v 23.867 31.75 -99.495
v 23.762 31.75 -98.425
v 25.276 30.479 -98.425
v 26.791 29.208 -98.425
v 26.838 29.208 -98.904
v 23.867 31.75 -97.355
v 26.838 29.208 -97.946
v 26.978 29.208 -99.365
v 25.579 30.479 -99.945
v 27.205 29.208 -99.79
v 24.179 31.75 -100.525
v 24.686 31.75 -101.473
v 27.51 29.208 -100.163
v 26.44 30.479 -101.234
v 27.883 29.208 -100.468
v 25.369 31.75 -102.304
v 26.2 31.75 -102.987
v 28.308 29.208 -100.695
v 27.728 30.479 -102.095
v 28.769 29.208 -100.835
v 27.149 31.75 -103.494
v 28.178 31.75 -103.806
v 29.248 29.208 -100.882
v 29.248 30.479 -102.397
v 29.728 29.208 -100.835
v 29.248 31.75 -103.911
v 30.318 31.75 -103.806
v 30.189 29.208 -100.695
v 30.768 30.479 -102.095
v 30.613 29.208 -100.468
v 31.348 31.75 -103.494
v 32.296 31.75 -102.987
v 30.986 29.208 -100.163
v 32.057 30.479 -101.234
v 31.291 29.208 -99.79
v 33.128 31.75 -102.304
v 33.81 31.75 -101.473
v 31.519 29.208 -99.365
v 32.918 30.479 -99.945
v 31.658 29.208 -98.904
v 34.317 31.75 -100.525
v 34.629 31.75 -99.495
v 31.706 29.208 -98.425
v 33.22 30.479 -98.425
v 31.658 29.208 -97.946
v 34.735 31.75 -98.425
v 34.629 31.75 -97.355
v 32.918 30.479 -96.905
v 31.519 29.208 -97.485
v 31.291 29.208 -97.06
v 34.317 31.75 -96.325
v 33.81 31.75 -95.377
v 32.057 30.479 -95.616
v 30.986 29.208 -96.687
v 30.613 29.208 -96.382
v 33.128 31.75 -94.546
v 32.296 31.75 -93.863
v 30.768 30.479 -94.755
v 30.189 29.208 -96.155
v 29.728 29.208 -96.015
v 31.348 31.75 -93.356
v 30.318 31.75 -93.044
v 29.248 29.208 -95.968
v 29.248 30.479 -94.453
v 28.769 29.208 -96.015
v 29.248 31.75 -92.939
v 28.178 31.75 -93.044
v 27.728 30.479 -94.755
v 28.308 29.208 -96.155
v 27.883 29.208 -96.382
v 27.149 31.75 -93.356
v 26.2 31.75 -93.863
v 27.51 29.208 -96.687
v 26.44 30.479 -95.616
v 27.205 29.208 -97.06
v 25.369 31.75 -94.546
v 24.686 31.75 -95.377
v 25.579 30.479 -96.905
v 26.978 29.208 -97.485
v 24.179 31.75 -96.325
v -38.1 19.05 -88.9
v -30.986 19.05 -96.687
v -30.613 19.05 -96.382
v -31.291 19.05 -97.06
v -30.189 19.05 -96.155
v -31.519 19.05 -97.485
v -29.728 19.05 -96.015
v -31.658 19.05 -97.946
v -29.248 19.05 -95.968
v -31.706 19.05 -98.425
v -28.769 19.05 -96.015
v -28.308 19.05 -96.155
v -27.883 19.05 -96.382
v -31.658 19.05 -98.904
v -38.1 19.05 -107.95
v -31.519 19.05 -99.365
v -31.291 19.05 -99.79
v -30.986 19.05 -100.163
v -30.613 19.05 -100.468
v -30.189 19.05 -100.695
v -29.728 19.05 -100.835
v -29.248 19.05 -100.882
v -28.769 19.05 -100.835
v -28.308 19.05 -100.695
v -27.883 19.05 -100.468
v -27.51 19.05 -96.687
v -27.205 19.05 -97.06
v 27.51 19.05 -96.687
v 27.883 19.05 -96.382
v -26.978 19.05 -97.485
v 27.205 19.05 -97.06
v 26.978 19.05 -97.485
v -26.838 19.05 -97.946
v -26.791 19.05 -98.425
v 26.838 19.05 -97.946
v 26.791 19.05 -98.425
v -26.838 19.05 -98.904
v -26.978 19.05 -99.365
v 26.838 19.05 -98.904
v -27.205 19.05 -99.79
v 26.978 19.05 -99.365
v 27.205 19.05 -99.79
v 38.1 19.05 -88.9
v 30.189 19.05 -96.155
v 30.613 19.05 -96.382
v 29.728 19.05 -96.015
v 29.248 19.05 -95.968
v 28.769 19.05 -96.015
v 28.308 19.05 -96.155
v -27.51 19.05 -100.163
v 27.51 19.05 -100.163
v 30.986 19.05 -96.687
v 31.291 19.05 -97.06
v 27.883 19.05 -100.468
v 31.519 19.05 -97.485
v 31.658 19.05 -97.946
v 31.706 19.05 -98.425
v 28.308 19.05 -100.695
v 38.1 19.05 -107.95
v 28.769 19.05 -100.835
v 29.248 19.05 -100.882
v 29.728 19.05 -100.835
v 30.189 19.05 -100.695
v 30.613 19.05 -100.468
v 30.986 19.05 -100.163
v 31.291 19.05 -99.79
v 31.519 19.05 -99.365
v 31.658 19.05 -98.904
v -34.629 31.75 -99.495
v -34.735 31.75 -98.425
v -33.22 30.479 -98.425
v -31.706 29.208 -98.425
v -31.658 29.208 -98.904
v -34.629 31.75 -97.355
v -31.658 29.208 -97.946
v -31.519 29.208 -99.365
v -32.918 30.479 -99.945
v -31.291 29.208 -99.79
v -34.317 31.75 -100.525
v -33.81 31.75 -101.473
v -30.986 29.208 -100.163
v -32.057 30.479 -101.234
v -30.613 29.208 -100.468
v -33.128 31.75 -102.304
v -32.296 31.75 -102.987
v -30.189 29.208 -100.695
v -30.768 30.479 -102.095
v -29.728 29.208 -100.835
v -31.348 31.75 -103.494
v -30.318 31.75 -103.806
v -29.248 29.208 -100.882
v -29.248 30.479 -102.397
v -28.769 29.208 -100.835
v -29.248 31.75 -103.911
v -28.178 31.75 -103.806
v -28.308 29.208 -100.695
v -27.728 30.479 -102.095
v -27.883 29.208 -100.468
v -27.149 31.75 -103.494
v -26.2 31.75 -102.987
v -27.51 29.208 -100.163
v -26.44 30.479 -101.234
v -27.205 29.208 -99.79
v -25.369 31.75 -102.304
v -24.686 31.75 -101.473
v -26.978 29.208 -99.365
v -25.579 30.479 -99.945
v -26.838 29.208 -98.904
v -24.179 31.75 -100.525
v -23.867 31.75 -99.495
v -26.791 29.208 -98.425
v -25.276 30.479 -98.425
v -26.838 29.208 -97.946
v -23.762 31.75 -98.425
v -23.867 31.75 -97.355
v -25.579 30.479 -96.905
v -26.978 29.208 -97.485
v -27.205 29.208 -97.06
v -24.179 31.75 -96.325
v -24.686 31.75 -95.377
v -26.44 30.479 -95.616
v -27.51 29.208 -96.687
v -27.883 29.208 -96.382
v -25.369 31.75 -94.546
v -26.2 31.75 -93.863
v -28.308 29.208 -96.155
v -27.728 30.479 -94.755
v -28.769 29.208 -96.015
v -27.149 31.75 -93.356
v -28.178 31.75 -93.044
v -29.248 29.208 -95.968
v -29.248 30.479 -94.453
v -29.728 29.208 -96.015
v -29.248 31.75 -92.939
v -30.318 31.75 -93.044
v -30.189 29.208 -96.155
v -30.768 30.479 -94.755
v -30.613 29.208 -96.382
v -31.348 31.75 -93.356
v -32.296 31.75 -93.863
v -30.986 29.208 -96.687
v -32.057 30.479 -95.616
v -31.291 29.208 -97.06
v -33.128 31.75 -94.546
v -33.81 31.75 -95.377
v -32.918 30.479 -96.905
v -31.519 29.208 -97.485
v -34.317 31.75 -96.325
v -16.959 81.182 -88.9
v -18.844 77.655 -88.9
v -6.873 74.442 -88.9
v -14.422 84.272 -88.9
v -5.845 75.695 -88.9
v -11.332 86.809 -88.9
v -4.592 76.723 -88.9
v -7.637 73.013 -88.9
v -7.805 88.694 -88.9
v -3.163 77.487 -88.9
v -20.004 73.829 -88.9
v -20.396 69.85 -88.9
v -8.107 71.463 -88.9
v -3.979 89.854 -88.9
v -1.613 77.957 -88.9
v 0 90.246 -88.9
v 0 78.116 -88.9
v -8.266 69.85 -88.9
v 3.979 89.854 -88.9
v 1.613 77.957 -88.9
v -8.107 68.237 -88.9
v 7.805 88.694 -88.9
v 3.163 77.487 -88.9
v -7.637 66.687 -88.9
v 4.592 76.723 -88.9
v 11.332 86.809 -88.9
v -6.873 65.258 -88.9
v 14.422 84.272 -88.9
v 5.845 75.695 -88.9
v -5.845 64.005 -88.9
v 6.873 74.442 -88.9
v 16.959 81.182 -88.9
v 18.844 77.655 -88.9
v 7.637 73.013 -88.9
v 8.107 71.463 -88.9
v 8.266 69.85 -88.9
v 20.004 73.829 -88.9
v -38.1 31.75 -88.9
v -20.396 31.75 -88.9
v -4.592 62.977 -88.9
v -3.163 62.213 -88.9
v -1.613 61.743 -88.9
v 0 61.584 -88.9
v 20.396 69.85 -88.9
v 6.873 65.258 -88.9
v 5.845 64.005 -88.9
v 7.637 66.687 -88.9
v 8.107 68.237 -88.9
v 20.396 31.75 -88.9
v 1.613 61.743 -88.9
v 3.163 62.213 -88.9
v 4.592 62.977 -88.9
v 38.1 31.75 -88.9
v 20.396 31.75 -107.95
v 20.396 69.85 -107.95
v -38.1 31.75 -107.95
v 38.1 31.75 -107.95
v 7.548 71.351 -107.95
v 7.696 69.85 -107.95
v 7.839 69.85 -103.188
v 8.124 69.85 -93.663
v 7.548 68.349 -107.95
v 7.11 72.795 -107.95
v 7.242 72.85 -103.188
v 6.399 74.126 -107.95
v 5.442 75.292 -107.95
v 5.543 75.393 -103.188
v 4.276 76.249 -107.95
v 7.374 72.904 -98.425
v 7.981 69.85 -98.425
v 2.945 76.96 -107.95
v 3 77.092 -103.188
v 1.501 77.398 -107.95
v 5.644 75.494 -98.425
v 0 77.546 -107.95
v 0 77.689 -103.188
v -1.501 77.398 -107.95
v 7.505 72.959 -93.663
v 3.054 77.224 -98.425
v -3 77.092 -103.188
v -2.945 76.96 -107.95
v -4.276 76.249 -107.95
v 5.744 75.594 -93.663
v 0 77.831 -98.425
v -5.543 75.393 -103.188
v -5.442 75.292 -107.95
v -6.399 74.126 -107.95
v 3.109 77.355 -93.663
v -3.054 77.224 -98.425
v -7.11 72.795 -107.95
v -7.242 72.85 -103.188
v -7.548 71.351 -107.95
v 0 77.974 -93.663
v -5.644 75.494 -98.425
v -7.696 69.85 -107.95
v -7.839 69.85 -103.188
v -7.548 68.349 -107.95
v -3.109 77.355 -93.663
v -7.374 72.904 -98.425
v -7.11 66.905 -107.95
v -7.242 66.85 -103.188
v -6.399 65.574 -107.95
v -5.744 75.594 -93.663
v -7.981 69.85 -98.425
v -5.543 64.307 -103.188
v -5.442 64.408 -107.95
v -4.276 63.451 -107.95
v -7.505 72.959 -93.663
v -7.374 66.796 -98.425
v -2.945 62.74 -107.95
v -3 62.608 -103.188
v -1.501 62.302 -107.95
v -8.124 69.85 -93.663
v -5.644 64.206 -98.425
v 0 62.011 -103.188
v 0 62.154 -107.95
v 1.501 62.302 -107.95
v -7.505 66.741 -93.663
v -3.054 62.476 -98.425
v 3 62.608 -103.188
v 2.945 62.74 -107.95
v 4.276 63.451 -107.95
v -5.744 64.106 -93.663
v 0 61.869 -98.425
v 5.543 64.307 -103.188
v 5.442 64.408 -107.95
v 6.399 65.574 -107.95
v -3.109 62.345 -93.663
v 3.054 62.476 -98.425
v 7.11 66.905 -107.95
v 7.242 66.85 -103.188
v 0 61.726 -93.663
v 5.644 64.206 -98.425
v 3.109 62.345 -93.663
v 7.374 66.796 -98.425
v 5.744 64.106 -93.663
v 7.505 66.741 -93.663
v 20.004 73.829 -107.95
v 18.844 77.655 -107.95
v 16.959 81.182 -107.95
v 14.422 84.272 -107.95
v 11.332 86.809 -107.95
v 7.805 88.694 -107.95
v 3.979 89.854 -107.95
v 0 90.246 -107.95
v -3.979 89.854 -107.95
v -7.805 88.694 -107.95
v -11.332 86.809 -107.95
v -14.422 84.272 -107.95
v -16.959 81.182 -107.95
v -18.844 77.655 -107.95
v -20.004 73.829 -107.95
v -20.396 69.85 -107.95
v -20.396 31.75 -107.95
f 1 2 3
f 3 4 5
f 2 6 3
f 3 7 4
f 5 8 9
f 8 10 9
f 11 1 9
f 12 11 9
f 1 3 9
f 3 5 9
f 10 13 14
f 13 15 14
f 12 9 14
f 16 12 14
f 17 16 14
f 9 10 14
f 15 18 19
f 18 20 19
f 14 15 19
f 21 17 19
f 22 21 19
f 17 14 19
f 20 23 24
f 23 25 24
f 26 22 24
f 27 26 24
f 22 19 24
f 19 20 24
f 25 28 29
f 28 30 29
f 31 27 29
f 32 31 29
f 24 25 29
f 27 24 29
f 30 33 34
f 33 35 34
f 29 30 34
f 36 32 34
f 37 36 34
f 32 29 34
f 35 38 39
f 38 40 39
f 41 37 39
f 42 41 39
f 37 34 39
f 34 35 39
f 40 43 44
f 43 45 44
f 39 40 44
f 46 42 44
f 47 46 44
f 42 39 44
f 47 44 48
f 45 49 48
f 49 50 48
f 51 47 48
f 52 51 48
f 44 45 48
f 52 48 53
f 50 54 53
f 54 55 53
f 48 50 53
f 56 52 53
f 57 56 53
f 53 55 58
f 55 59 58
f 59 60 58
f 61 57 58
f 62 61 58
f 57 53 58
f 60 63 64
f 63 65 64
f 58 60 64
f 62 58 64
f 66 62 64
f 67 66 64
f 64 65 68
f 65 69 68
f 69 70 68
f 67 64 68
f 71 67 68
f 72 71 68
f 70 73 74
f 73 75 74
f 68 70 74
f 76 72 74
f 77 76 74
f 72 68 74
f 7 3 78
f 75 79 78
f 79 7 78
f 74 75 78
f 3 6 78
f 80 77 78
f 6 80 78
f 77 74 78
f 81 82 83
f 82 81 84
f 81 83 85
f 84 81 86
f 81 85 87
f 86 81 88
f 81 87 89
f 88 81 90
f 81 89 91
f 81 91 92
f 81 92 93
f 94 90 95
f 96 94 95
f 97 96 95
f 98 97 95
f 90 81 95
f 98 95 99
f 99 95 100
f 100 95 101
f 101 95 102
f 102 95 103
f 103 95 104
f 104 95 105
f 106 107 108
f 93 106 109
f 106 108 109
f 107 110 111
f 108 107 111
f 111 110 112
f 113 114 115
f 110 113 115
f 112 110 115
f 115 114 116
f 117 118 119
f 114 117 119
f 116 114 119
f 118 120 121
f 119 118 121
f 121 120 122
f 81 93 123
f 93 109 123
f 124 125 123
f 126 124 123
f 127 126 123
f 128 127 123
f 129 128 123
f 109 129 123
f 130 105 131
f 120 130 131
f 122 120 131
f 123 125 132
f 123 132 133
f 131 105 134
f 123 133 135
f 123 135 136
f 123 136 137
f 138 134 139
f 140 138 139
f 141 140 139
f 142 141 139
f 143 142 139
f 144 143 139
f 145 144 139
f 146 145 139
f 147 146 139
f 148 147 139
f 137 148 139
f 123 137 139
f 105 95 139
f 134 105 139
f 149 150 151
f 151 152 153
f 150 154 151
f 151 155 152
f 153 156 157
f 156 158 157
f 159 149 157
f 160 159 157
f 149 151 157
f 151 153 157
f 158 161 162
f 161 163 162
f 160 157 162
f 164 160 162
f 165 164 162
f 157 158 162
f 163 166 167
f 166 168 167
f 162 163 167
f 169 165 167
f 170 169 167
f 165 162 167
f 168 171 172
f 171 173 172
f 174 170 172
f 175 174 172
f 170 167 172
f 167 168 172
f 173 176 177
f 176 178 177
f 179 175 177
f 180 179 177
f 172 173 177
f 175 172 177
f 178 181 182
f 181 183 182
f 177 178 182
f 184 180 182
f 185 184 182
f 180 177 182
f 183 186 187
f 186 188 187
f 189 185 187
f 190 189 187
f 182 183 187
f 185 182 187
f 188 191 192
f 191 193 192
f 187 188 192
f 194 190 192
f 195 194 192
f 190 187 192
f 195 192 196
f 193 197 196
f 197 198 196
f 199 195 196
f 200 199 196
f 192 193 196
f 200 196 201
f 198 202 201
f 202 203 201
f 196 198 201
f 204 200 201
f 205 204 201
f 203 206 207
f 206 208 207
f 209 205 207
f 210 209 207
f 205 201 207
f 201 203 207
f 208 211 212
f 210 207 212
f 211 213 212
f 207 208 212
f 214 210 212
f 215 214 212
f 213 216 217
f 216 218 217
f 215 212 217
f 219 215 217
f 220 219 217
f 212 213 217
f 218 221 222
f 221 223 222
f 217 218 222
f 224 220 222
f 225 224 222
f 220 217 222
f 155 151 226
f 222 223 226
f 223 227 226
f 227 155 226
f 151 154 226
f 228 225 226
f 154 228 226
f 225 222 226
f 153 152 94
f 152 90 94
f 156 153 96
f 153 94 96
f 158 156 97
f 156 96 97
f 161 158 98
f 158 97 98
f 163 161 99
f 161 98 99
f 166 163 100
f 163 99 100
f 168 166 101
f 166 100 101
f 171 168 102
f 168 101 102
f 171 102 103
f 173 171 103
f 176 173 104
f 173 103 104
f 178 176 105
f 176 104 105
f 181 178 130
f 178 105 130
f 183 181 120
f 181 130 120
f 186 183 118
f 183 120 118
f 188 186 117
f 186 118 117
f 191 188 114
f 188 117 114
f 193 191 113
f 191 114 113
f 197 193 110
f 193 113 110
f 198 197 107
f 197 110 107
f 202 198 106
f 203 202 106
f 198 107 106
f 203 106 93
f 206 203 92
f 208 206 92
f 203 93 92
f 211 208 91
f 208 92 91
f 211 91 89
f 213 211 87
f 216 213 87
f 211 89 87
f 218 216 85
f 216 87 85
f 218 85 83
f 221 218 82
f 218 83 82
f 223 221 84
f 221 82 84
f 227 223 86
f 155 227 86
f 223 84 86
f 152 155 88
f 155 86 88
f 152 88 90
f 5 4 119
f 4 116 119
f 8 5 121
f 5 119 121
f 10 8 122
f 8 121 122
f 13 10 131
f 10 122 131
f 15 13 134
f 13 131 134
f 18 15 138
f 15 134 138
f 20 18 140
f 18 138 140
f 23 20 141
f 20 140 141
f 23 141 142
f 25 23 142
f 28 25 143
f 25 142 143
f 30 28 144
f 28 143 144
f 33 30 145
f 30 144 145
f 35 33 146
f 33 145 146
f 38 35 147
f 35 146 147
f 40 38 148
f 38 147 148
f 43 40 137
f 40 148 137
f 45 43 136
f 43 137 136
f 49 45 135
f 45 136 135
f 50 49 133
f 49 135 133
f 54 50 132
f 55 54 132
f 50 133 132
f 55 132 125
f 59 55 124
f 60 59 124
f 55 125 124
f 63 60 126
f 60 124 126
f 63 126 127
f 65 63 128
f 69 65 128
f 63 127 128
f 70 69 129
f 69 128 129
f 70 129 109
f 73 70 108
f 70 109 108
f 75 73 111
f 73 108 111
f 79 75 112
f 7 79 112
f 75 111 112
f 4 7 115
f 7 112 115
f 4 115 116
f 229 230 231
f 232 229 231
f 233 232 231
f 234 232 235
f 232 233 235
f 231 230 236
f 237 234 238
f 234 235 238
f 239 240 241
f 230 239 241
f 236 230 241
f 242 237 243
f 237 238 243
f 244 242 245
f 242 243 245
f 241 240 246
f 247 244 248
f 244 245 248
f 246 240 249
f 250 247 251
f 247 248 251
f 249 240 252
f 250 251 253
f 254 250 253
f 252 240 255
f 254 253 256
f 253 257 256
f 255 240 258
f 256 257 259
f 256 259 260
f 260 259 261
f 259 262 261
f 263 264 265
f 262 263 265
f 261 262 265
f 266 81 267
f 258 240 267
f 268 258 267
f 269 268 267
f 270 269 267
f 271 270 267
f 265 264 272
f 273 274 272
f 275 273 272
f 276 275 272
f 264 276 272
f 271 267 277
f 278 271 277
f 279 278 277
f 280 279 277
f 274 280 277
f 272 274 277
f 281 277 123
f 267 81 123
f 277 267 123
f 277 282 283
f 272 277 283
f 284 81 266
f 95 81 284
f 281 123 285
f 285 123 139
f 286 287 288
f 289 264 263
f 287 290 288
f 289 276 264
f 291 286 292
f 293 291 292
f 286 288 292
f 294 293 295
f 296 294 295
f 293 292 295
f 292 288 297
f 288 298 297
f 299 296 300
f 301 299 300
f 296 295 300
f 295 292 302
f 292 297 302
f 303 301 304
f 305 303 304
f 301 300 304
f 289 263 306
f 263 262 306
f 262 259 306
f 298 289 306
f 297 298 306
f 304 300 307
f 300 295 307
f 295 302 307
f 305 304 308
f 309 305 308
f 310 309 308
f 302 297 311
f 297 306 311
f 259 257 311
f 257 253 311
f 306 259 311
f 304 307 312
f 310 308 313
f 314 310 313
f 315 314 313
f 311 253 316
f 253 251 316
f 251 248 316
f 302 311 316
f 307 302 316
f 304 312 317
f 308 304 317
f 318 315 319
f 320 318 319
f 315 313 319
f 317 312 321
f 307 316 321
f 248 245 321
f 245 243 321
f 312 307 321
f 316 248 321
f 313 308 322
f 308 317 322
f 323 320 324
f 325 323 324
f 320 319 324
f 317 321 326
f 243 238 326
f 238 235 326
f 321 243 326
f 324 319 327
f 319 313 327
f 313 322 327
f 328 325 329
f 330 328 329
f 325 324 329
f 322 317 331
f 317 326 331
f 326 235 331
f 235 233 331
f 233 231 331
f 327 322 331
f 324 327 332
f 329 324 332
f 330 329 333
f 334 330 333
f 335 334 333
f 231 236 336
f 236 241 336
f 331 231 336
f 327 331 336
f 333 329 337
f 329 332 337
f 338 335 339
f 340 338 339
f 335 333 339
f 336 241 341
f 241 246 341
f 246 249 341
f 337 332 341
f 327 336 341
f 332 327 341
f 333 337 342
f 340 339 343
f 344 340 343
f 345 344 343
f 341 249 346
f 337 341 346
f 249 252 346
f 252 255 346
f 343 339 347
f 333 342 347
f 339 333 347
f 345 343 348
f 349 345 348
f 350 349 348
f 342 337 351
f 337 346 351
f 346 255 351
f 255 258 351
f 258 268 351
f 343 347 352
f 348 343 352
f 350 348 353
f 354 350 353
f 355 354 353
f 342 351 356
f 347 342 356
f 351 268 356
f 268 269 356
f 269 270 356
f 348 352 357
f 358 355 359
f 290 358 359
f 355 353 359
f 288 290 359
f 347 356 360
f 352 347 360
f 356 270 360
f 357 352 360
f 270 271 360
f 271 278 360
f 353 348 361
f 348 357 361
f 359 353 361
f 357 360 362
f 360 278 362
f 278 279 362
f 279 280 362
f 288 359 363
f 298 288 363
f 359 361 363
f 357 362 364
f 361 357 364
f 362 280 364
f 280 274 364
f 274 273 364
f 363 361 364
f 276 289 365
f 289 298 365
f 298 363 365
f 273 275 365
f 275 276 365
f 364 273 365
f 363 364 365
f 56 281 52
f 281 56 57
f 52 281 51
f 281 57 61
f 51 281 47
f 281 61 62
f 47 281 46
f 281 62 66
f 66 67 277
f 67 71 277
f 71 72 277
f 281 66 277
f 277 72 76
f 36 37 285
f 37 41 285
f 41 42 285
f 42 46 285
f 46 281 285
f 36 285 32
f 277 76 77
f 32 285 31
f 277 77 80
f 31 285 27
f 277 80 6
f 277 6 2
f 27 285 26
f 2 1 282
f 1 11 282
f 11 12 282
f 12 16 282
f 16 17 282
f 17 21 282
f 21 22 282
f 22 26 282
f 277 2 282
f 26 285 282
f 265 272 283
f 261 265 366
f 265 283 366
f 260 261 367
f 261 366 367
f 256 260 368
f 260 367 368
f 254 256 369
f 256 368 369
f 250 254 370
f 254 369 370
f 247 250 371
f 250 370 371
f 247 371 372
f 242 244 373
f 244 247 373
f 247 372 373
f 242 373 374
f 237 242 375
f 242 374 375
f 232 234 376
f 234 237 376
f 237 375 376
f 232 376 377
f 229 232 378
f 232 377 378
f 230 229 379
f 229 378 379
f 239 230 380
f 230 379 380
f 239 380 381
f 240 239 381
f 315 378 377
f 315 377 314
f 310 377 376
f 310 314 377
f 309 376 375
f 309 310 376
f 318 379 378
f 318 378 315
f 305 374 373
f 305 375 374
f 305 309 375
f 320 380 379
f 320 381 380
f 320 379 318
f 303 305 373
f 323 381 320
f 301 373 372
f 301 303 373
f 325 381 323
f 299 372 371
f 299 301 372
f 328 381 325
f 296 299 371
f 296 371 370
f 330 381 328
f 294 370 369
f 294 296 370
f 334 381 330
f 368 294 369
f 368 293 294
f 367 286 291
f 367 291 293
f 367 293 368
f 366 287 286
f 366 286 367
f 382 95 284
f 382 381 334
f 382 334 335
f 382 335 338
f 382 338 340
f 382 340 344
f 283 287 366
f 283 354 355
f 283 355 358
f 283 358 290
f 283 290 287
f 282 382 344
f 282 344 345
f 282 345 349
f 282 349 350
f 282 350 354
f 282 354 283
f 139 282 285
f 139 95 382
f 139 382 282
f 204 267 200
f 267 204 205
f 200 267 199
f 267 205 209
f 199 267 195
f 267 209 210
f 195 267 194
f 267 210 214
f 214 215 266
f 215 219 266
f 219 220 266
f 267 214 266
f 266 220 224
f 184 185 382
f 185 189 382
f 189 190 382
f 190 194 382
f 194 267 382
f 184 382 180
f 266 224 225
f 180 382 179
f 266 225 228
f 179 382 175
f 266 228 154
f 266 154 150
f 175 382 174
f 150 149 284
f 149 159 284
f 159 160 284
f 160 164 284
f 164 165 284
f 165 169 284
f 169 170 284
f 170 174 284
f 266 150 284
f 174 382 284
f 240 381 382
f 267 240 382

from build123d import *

# Parameters (mm, degrees)
SKETCH1_W                                         = 76.2
SKETCH1_H                                         = 19.05
BOSS_EXTRUDE1_DEPTH                               = 104.14
CUT_EXTRUDE1_DEPTH                                = 131.346801265
CSK_FOR_8_FLAT_HEAD_MACHINE_SCREW_100_D           = 4.9149
CSK_FOR_8_FLAT_HEAD_MACHINE_SCREW_100_CSINK_D     = 10.9728
CSK_FOR_8_FLAT_HEAD_MACHINE_SCREW_100_CSINK_ANGLE = 100


# Read off the part's stored shape, not the designer's step: SurfaceCut1
with BuildPart() as part:
    # Sketch1 → Boss-Extrude1 (new body)
    with BuildSketch(Plane(origin=(0, 19.05, 0), x_dir=(1, 0, 0), z_dir=(0, 1, 0))):
        with Locations((0, 98.425)):
            Rectangle(SKETCH1_W, SKETCH1_H)
    extrude(amount=BOSS_EXTRUDE1_DEPTH)

    # SurfaceCut1 outline → SurfaceCut1 (revolve, cut)
    with BuildSketch(Plane.XZ.offset(-69.85)):
        Polygon((8.266242493, -88.9), (0, -88.9), (0, -107.95), (7.696303968, -107.95), align=None)
    revolve(axis=Axis((0, 69.85, 0), (0, 0, 1)), mode=Mode.SUBTRACT)

    # Sketch3 → Cut-Extrude1 (cut, through all)
    with BuildSketch(Plane(origin=(0, 0, -107.95), x_dir=(-1, 0, 0), z_dir=(0, 0, -1))):
        with BuildLine():
            Line((25.4, 31.75), (37.1816, 31.75))
            Line((37.1816, 31.75), (38.1, 31.75))
            Line((38.1, 31.75), (38.1, 123.19))
            Line((38.1, 123.19), (-38.1, 123.19))
            Line((-38.1, 123.19), (-38.1, 31.75))
            Line((-38.1, 31.75), (-37.1816, 31.75))
            Line((-37.1816, 31.75), (-25.4, 31.75))
            Line((-25.4, 31.75), (-20.396303968, 31.75))
            Line((-20.396303968, 31.75), (-20.396303968, 69.85))
            ThreePointArc((-20.396303968, 69.85), (0, 90.246303968), (20.396303968, 69.85))
            Line((20.396303968, 69.85), (20.396303968, 31.75))
            Line((20.396303968, 31.75), (25.4, 31.75))
        make_face()
    extrude(amount=-CUT_EXTRUDE1_DEPTH, mode=Mode.SUBTRACT)

    # CSK for #8 Flat Head Machine Screw (100)1 (through all)
    with Locations(Plane(origin=(0, 31.75, 0), x_dir=(1, 0, 0), z_dir=(0, 1, 0))):
        with Locations((-29.248151984, 98.425), (29.248151984, 98.425)):
            CounterSinkHole(CSK_FOR_8_FLAT_HEAD_MACHINE_SCREW_100_D / 2, CSK_FOR_8_FLAT_HEAD_MACHINE_SCREW_100_CSINK_D / 2, counter_sink_angle=CSK_FOR_8_FLAT_HEAD_MACHINE_SCREW_100_CSINK_ANGLE)


solid = part.part
